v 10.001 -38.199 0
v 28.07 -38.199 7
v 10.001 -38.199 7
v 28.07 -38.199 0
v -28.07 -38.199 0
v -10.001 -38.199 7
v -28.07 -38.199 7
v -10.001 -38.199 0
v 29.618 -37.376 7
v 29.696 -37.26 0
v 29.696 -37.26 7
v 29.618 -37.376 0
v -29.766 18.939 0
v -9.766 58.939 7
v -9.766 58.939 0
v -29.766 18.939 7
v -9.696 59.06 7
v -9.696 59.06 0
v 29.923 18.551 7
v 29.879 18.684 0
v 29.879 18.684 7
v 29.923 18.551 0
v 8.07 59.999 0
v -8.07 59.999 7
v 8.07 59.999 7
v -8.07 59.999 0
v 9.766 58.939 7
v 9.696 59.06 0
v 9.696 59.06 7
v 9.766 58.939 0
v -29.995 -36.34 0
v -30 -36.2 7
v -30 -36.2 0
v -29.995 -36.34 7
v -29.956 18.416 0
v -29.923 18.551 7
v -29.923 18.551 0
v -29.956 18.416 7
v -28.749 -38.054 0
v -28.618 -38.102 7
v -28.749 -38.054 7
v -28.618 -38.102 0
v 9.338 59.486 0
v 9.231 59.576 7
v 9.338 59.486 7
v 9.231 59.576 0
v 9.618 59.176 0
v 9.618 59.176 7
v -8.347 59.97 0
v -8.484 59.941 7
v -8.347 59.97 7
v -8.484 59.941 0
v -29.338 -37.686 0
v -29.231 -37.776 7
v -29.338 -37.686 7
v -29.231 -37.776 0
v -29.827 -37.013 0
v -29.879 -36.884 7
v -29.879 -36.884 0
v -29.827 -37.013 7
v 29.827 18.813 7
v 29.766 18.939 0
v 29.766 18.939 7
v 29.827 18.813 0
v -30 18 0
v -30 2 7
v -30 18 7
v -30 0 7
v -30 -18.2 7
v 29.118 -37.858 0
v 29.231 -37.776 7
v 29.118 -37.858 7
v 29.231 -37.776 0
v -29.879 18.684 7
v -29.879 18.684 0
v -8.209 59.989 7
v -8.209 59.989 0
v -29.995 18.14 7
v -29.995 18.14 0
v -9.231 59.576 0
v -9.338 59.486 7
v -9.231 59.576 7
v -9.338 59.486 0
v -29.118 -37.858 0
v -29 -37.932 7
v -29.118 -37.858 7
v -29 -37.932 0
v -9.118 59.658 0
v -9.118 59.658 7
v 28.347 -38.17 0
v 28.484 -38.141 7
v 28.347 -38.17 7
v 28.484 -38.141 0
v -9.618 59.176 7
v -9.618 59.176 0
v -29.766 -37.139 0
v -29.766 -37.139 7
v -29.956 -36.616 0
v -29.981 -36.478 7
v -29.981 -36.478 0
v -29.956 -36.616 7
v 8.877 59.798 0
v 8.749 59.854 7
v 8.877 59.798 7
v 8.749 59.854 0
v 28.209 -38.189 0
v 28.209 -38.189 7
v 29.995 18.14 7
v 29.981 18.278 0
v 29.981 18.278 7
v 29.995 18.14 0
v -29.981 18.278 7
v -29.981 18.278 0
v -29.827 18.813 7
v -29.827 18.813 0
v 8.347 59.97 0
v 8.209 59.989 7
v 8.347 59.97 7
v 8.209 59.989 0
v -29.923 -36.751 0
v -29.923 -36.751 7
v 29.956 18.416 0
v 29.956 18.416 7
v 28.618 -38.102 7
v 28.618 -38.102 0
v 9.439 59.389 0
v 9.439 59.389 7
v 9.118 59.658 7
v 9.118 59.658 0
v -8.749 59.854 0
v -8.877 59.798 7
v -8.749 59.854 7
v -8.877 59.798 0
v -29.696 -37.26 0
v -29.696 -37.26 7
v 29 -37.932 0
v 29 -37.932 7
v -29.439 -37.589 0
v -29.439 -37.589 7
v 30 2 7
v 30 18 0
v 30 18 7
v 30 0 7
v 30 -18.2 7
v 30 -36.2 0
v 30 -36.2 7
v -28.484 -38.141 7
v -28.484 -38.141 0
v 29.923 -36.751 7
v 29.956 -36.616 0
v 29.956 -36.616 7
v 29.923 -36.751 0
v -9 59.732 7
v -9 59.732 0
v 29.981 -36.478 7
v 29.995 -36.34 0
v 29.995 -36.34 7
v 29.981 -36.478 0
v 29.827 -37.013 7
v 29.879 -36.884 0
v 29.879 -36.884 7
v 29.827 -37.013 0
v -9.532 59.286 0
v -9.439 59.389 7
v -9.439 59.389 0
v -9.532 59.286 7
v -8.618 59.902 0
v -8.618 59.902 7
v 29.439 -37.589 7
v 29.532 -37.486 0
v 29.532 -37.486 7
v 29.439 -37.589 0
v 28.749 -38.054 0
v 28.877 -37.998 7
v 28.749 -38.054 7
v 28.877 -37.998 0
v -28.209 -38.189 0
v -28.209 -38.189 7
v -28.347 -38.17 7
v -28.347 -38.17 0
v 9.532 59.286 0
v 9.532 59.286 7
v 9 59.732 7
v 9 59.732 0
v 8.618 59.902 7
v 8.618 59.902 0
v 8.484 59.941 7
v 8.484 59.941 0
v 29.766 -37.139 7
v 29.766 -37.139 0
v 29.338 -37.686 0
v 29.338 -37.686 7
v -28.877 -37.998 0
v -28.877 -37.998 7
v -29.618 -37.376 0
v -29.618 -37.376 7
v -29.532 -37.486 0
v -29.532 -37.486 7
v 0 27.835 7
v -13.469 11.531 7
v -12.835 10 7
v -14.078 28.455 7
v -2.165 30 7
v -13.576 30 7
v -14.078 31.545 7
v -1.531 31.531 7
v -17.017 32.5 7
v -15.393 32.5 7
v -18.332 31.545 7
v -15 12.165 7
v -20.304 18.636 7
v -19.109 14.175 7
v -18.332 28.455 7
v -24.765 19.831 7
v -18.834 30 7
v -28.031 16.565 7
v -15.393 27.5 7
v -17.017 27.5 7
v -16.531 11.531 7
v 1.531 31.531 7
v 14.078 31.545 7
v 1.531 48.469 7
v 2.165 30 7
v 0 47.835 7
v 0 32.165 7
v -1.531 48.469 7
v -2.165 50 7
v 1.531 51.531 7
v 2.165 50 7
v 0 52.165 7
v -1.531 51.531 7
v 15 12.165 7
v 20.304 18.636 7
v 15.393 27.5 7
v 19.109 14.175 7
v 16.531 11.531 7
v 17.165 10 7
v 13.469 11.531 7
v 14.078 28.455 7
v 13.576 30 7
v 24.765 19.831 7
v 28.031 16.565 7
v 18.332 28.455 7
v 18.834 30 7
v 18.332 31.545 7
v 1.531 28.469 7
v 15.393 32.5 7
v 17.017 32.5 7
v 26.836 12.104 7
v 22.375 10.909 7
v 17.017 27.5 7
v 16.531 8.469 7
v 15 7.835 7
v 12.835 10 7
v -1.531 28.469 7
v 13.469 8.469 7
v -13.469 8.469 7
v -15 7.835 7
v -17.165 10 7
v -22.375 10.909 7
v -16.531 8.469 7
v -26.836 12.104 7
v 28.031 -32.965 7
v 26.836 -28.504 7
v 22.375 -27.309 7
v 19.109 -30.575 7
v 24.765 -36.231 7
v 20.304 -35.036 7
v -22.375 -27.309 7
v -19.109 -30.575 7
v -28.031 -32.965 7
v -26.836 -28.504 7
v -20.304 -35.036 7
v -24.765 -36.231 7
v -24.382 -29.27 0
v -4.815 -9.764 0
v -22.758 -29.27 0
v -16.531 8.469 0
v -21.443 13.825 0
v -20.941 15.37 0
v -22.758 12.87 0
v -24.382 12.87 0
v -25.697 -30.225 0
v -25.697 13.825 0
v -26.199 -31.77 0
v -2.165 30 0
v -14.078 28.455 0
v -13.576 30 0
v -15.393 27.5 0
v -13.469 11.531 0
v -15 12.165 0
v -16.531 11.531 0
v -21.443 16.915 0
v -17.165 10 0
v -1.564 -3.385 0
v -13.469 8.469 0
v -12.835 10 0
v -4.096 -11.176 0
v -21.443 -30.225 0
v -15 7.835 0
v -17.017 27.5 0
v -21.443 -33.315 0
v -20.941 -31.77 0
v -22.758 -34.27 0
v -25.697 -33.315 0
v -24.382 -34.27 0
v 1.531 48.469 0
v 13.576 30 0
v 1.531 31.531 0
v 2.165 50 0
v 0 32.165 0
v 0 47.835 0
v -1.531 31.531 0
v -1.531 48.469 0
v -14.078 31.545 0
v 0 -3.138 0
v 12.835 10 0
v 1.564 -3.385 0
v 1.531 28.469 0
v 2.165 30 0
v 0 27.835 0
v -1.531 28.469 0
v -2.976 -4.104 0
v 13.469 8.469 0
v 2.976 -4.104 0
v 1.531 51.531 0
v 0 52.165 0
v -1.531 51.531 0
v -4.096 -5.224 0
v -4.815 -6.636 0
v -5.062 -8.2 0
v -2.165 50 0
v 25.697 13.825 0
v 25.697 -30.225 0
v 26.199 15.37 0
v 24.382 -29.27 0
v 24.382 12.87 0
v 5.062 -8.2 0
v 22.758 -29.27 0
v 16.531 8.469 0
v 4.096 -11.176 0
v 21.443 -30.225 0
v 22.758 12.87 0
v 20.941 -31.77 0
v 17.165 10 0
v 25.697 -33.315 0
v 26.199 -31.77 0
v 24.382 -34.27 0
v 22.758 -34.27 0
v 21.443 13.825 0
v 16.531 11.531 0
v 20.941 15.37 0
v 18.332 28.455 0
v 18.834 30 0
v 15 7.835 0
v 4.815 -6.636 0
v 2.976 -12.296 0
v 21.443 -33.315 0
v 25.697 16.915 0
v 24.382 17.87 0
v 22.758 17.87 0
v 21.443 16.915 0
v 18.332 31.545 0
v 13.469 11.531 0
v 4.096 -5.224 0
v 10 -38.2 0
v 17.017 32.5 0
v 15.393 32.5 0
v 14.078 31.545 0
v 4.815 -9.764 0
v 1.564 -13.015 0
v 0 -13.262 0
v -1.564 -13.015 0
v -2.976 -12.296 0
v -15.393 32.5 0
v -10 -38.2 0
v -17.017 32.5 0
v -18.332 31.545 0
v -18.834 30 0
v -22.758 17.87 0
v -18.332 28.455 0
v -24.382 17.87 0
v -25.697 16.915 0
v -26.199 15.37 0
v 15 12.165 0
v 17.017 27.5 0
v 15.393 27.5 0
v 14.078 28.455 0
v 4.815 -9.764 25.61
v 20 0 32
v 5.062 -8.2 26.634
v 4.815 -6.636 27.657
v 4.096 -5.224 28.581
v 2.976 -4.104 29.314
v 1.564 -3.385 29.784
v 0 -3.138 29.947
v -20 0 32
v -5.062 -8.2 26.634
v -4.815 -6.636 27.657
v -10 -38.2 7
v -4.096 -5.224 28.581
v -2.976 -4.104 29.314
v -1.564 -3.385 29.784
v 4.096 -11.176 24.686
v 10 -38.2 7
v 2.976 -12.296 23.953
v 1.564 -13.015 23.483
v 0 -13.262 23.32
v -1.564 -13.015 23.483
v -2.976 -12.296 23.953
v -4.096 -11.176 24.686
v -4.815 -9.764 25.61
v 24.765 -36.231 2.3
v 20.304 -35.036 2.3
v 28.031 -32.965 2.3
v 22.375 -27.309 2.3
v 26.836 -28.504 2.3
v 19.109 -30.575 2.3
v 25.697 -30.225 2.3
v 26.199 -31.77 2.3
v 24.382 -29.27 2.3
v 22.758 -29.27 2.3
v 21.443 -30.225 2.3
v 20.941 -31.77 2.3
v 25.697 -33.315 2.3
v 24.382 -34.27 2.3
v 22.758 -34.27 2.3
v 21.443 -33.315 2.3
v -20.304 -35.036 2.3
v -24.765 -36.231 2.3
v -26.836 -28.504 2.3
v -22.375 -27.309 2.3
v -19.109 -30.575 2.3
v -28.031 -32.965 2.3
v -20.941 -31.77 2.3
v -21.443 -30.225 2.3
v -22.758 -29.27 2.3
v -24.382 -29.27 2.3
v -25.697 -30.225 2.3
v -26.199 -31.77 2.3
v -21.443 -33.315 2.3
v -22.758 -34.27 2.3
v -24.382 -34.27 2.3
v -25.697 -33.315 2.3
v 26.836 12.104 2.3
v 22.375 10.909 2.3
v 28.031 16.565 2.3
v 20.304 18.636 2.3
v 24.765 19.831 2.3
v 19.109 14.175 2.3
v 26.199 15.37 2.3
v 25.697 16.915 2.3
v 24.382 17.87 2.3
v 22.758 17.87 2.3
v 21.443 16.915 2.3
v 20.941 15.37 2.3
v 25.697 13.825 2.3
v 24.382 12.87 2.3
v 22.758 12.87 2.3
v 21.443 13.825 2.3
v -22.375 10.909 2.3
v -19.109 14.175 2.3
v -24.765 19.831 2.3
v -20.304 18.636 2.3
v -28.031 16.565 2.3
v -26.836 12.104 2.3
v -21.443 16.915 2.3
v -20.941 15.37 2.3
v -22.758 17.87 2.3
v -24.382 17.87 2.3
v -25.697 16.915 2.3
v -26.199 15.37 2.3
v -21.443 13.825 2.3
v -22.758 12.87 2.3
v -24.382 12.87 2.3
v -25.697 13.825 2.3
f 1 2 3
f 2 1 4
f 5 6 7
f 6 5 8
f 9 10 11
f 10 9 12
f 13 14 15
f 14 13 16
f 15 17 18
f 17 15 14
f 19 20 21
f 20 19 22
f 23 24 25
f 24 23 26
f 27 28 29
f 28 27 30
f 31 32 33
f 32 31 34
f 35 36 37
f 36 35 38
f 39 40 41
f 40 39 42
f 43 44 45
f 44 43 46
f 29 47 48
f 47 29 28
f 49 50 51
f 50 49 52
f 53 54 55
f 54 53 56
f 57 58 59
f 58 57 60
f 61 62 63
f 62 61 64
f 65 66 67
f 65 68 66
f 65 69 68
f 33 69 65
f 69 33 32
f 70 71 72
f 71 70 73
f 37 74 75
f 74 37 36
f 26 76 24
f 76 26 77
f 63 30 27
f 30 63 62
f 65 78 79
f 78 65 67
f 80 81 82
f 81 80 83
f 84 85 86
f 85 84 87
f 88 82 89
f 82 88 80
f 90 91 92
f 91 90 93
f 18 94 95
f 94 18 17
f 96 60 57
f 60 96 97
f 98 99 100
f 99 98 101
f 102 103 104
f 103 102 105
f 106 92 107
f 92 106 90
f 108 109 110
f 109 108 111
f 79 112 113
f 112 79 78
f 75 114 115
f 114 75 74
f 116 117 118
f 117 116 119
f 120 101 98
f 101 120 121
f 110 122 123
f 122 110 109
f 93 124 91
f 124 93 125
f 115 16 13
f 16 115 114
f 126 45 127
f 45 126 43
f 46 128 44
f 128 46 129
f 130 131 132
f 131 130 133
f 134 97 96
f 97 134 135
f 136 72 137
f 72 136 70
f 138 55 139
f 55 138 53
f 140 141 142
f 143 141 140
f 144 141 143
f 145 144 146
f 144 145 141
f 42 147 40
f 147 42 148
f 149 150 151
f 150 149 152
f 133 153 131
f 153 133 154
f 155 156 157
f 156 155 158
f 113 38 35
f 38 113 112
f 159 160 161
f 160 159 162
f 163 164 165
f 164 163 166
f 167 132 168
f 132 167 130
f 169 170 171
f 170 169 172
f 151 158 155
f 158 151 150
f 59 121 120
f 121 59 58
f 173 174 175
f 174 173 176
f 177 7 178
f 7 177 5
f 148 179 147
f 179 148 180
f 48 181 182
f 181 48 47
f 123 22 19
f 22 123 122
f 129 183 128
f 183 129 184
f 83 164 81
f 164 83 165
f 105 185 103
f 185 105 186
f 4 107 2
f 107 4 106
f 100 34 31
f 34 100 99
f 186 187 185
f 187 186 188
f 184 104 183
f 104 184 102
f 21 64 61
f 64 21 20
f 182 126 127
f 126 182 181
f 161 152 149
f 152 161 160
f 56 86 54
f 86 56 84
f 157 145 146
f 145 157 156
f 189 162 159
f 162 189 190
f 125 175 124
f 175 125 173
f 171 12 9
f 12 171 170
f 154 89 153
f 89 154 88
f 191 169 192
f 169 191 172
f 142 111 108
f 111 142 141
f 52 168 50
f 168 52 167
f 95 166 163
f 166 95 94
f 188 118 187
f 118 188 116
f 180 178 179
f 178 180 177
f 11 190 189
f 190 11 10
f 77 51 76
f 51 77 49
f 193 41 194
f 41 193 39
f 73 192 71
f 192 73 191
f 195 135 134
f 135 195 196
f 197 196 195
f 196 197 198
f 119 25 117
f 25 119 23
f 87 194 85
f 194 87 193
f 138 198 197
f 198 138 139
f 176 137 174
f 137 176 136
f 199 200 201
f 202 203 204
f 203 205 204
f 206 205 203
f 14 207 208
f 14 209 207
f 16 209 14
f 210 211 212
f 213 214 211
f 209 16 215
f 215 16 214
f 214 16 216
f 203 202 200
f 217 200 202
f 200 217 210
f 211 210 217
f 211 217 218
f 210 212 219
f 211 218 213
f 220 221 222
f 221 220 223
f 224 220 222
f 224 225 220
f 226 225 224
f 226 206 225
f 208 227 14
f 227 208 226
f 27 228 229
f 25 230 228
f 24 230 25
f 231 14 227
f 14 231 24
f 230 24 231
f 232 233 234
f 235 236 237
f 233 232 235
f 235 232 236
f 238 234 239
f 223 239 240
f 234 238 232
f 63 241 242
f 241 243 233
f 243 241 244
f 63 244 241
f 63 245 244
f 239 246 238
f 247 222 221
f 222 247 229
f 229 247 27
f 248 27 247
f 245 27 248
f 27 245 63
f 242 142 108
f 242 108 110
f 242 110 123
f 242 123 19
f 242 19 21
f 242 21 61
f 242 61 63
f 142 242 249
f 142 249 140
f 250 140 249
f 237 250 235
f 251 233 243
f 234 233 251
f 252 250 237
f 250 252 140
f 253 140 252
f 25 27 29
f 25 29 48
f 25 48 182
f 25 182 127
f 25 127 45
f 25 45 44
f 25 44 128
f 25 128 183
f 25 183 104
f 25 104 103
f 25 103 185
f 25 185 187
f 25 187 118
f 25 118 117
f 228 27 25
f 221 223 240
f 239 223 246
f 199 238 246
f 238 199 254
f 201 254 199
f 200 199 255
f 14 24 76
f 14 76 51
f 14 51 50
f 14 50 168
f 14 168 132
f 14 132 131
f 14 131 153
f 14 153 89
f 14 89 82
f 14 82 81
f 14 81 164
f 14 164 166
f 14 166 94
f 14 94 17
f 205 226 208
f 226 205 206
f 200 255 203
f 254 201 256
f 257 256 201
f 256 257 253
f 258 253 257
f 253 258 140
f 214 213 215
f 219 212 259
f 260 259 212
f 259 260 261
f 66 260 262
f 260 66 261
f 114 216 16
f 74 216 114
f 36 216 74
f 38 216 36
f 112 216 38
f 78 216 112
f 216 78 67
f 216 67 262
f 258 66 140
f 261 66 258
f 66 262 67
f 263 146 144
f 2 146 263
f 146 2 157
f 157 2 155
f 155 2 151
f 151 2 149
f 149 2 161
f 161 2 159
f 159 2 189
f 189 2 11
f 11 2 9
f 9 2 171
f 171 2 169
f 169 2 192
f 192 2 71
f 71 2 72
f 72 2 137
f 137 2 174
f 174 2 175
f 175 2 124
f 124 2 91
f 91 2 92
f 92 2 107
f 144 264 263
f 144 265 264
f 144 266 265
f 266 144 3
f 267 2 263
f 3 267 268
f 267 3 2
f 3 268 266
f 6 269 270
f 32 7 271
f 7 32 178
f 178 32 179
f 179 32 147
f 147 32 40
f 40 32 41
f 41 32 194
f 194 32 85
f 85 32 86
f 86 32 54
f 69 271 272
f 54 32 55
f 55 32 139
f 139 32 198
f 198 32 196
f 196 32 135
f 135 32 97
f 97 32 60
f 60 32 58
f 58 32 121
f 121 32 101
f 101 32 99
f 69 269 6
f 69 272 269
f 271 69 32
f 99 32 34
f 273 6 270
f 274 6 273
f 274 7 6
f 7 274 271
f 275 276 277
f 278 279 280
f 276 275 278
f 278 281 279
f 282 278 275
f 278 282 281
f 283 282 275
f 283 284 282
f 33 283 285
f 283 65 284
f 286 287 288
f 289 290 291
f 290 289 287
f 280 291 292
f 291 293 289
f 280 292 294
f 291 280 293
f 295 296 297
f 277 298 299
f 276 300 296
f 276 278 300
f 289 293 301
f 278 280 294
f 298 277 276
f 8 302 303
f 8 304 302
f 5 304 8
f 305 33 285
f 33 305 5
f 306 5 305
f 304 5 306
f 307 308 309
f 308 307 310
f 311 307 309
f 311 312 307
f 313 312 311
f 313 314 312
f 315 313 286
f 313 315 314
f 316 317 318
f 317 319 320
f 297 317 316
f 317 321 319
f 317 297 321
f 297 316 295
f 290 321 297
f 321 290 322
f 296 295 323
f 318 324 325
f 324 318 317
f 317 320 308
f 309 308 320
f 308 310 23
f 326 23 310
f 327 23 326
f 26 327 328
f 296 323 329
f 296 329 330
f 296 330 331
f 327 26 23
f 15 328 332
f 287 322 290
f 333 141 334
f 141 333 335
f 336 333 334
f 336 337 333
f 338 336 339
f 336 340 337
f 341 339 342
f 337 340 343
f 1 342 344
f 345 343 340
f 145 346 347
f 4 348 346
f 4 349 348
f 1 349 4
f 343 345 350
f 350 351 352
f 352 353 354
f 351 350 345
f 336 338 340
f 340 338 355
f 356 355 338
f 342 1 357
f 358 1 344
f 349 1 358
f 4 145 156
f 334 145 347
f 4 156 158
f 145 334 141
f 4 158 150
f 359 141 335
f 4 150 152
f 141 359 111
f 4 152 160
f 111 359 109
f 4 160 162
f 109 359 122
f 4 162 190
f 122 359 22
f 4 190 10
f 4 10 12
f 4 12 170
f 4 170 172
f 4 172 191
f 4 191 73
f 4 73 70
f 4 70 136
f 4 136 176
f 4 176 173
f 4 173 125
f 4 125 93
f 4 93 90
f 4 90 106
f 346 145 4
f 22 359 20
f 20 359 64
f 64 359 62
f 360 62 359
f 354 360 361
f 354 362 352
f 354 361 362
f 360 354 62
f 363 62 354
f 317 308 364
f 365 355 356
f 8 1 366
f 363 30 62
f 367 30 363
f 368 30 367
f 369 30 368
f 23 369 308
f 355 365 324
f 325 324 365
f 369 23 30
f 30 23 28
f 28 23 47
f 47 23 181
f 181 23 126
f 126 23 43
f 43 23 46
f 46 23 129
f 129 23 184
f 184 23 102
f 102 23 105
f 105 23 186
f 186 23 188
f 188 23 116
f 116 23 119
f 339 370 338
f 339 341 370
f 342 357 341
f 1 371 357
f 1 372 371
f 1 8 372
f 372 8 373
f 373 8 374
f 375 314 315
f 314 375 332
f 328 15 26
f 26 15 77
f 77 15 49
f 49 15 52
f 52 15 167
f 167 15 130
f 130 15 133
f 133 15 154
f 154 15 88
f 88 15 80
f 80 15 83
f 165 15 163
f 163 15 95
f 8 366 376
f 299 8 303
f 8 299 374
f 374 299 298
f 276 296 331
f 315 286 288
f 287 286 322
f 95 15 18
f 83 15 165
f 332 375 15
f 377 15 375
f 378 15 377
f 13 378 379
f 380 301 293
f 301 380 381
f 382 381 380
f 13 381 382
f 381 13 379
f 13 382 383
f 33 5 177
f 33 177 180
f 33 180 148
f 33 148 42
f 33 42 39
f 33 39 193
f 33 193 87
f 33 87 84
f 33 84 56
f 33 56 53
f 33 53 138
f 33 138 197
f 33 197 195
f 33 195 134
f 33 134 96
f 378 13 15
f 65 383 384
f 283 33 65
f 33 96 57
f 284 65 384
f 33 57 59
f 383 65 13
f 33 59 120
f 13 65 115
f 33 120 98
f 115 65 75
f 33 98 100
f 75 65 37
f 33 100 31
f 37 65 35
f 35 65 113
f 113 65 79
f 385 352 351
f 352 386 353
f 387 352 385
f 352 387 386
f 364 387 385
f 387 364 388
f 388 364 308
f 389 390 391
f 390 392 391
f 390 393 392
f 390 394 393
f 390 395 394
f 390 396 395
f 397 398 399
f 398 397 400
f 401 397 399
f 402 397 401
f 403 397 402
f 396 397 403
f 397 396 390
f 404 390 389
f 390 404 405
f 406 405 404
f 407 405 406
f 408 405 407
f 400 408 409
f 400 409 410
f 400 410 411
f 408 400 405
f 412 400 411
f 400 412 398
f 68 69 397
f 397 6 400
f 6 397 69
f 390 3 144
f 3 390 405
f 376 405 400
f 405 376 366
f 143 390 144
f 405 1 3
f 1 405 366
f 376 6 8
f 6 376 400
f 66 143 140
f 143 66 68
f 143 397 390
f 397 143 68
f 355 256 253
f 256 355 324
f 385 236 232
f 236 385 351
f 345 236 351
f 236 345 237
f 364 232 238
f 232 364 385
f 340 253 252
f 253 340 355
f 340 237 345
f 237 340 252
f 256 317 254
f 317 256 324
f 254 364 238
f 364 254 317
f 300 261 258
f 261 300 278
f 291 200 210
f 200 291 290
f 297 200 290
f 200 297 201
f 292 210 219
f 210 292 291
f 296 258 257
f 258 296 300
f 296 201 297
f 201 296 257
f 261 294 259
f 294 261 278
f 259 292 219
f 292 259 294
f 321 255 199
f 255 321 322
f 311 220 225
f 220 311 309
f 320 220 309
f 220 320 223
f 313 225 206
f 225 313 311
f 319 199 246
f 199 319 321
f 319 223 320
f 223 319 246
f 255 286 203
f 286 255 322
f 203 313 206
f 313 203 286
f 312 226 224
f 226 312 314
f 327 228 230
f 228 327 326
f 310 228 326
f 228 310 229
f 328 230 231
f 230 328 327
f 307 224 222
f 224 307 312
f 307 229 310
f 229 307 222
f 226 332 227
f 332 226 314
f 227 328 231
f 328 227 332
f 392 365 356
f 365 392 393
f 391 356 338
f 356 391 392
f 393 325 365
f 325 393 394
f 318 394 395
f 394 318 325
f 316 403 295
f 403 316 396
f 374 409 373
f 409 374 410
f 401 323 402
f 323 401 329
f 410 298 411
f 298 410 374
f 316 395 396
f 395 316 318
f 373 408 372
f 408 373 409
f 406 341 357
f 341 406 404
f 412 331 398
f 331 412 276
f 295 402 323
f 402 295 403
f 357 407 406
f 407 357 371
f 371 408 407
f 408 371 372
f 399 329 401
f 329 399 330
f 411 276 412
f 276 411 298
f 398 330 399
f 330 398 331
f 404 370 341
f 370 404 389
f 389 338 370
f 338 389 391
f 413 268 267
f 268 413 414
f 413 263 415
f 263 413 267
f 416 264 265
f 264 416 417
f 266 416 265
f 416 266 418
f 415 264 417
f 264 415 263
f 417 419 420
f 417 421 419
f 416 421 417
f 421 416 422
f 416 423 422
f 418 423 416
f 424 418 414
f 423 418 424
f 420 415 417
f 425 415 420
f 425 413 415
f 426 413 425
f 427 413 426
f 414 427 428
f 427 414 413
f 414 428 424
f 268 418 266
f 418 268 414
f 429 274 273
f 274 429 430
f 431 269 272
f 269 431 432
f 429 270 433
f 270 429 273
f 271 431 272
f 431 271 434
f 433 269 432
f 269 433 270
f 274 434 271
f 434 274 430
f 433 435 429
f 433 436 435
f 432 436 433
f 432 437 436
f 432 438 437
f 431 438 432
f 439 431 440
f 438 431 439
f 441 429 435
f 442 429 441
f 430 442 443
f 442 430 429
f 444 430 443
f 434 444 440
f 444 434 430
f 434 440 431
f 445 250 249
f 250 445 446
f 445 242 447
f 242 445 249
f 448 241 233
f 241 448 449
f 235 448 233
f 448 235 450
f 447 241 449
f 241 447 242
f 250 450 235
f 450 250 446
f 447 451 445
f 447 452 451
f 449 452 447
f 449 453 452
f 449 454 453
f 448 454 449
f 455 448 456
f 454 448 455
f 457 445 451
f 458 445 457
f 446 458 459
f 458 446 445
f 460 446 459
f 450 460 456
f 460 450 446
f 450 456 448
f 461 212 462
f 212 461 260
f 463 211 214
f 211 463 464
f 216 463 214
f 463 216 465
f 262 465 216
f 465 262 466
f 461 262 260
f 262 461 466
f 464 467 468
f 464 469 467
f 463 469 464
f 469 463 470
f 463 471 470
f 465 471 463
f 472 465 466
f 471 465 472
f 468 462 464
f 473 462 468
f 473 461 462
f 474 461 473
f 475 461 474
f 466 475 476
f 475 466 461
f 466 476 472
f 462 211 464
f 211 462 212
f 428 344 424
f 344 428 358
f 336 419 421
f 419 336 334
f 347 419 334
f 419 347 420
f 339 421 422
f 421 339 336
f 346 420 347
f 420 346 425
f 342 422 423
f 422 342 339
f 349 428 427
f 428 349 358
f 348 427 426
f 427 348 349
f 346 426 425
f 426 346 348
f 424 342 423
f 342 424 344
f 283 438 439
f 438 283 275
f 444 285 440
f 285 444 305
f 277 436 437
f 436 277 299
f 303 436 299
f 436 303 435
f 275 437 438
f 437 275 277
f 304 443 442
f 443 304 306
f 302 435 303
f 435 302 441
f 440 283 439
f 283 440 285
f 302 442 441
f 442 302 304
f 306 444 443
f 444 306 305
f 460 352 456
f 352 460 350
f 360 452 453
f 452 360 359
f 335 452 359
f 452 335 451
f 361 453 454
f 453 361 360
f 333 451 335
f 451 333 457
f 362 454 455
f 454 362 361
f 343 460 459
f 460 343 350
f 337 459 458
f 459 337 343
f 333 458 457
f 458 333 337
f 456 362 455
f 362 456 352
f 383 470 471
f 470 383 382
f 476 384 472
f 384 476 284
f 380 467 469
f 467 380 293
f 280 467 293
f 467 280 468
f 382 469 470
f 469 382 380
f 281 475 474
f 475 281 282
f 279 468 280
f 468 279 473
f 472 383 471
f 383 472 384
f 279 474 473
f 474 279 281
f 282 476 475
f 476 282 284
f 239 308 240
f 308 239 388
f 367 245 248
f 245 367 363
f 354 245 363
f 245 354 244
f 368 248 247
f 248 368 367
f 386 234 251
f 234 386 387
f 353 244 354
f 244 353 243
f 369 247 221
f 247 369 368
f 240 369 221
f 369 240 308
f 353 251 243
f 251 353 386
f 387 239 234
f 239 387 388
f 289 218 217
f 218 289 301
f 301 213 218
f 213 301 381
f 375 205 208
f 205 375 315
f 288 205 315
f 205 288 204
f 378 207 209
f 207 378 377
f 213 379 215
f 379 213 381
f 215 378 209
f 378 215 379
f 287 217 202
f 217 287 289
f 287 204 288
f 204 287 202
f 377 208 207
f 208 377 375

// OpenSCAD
// file: nutShape.scad
// a nut shape that takes height and width across flats as input.

nutShape(6, 3);

module nutShape(w, h)
{
    rotate_extrude($fn = 6)
        square([((w / 2) / (cos(30))), h], center = false);
}
// file: polyhole.scad
// The Cylinder is dead! Long live the Cylinder!
// A module for a polyhole by radius, based on Nophead's work.

module polyhole(h, r, cent = false)
{
    n = max(round(4 * r), 3);
    cylinder(h = h, r = r / cos(180 / n), $fn = n, center = cent);
}
// main file
// Bottom of z motor mount
// Uses 12mm m4 rather than 10mm

use<polyhole.scad>
use<nutShape.scad>

ZBottom();

module ZBottom()
{
    difference()
    {
        union()
        {
            hull()
            {
                translate([60/2-2, -56.4-(60-56.4)/2+20+2, 0])
                    cylinder(h = 7, r = 2, $fn = 90);
                translate([60/2-2, 20-2, 0])
                    cylinder(h = 7, r = 2, $fn = 90);
                translate([10-2, 60-2, 0])
                    cylinder(h = 7, r = 2, $fn = 90);
                translate([-10+2, 60-2, 0])
                    cylinder(h = 7, r = 2, $fn = 90);
                translate([-60/2+2, 20-2, 0])
                    cylinder(h = 7, r = 2, $fn = 90);
                translate([-60/2+2, -56.4-(60-56.4)/2+20+2, 0])
                    cylinder(h = 7, r = 2, $fn = 90);
            }
            hull()
            {
                translate([0, 1, 7/2])
                    cube([60, 2, 7], center = true);
                translate([0, 1, (7+20+5)/2])
                    cube([40, 2, 7+20+5], center = true);
                translate([0, -56.4-(60-56.4)/2+20+1, 7/2])
                    cube([20, 2, 7], center = true);
                translate([0, -56.4-(60-56.4)/2+20+20+1, 7/2])
                    cube([60, 2, 7], center = true);
            }
        }
        translate([0, 1, (20+5)/2+7])
            cube([60, 2, 20+5], center = true);
        translate([15, 10, 0])
            polyhole(7, 2);
        translate([-15, 10, 0])
            polyhole(7, 2);
        translate([0, 20+10, 0])
            polyhole(7, 2);
        translate([0, 60-10, 0])
            polyhole(7, 2);
        translate([0, -56.4/2+20, 0])
            polyhole(7+20+5, 5);
        translate([47.14/2, -56.4+20+(56.4-47.14)/2, 7-4.7])
            rotate([0, 0, -15])
                nutShape(8, 8);
        translate([-47.14/2, -56.4+20+(56.4-47.14)/2, 7-4.7])
            rotate([0, 0, 15])
                nutShape(8, 8);
        translate([47.14/2, 20-(56.4-47.14)/2, 7-4.7])
            rotate([0, 0, 15])
                nutShape(8, 8);
        translate([-47.14/2, 20-(56.4-47.14)/2, 7-4.7])
            rotate([0, 0, -15])
                nutShape(8, 8);
        translate([47.14/2, -56.4+20+(56.4-47.14)/2, 0])
            polyhole(7, 2.5);
        translate([-47.14/2, -56.4+20+(56.4-47.14)/2, 0])
            polyhole(7, 2.5);
        translate([47.14/2, 20-(56.4-47.14)/2, 0])
            polyhole(7, 2.5);
        translate([-47.14/2, 20-(56.4-47.14)/2, 0])
            polyhole(7, 2.5);
        translate([(22.41+10)/2, 30, 0])
            polyhole(7, 2.5);
        translate([-(22.41+10)/2, 30, 0])
            polyhole(7, 2.5);
    }
}
